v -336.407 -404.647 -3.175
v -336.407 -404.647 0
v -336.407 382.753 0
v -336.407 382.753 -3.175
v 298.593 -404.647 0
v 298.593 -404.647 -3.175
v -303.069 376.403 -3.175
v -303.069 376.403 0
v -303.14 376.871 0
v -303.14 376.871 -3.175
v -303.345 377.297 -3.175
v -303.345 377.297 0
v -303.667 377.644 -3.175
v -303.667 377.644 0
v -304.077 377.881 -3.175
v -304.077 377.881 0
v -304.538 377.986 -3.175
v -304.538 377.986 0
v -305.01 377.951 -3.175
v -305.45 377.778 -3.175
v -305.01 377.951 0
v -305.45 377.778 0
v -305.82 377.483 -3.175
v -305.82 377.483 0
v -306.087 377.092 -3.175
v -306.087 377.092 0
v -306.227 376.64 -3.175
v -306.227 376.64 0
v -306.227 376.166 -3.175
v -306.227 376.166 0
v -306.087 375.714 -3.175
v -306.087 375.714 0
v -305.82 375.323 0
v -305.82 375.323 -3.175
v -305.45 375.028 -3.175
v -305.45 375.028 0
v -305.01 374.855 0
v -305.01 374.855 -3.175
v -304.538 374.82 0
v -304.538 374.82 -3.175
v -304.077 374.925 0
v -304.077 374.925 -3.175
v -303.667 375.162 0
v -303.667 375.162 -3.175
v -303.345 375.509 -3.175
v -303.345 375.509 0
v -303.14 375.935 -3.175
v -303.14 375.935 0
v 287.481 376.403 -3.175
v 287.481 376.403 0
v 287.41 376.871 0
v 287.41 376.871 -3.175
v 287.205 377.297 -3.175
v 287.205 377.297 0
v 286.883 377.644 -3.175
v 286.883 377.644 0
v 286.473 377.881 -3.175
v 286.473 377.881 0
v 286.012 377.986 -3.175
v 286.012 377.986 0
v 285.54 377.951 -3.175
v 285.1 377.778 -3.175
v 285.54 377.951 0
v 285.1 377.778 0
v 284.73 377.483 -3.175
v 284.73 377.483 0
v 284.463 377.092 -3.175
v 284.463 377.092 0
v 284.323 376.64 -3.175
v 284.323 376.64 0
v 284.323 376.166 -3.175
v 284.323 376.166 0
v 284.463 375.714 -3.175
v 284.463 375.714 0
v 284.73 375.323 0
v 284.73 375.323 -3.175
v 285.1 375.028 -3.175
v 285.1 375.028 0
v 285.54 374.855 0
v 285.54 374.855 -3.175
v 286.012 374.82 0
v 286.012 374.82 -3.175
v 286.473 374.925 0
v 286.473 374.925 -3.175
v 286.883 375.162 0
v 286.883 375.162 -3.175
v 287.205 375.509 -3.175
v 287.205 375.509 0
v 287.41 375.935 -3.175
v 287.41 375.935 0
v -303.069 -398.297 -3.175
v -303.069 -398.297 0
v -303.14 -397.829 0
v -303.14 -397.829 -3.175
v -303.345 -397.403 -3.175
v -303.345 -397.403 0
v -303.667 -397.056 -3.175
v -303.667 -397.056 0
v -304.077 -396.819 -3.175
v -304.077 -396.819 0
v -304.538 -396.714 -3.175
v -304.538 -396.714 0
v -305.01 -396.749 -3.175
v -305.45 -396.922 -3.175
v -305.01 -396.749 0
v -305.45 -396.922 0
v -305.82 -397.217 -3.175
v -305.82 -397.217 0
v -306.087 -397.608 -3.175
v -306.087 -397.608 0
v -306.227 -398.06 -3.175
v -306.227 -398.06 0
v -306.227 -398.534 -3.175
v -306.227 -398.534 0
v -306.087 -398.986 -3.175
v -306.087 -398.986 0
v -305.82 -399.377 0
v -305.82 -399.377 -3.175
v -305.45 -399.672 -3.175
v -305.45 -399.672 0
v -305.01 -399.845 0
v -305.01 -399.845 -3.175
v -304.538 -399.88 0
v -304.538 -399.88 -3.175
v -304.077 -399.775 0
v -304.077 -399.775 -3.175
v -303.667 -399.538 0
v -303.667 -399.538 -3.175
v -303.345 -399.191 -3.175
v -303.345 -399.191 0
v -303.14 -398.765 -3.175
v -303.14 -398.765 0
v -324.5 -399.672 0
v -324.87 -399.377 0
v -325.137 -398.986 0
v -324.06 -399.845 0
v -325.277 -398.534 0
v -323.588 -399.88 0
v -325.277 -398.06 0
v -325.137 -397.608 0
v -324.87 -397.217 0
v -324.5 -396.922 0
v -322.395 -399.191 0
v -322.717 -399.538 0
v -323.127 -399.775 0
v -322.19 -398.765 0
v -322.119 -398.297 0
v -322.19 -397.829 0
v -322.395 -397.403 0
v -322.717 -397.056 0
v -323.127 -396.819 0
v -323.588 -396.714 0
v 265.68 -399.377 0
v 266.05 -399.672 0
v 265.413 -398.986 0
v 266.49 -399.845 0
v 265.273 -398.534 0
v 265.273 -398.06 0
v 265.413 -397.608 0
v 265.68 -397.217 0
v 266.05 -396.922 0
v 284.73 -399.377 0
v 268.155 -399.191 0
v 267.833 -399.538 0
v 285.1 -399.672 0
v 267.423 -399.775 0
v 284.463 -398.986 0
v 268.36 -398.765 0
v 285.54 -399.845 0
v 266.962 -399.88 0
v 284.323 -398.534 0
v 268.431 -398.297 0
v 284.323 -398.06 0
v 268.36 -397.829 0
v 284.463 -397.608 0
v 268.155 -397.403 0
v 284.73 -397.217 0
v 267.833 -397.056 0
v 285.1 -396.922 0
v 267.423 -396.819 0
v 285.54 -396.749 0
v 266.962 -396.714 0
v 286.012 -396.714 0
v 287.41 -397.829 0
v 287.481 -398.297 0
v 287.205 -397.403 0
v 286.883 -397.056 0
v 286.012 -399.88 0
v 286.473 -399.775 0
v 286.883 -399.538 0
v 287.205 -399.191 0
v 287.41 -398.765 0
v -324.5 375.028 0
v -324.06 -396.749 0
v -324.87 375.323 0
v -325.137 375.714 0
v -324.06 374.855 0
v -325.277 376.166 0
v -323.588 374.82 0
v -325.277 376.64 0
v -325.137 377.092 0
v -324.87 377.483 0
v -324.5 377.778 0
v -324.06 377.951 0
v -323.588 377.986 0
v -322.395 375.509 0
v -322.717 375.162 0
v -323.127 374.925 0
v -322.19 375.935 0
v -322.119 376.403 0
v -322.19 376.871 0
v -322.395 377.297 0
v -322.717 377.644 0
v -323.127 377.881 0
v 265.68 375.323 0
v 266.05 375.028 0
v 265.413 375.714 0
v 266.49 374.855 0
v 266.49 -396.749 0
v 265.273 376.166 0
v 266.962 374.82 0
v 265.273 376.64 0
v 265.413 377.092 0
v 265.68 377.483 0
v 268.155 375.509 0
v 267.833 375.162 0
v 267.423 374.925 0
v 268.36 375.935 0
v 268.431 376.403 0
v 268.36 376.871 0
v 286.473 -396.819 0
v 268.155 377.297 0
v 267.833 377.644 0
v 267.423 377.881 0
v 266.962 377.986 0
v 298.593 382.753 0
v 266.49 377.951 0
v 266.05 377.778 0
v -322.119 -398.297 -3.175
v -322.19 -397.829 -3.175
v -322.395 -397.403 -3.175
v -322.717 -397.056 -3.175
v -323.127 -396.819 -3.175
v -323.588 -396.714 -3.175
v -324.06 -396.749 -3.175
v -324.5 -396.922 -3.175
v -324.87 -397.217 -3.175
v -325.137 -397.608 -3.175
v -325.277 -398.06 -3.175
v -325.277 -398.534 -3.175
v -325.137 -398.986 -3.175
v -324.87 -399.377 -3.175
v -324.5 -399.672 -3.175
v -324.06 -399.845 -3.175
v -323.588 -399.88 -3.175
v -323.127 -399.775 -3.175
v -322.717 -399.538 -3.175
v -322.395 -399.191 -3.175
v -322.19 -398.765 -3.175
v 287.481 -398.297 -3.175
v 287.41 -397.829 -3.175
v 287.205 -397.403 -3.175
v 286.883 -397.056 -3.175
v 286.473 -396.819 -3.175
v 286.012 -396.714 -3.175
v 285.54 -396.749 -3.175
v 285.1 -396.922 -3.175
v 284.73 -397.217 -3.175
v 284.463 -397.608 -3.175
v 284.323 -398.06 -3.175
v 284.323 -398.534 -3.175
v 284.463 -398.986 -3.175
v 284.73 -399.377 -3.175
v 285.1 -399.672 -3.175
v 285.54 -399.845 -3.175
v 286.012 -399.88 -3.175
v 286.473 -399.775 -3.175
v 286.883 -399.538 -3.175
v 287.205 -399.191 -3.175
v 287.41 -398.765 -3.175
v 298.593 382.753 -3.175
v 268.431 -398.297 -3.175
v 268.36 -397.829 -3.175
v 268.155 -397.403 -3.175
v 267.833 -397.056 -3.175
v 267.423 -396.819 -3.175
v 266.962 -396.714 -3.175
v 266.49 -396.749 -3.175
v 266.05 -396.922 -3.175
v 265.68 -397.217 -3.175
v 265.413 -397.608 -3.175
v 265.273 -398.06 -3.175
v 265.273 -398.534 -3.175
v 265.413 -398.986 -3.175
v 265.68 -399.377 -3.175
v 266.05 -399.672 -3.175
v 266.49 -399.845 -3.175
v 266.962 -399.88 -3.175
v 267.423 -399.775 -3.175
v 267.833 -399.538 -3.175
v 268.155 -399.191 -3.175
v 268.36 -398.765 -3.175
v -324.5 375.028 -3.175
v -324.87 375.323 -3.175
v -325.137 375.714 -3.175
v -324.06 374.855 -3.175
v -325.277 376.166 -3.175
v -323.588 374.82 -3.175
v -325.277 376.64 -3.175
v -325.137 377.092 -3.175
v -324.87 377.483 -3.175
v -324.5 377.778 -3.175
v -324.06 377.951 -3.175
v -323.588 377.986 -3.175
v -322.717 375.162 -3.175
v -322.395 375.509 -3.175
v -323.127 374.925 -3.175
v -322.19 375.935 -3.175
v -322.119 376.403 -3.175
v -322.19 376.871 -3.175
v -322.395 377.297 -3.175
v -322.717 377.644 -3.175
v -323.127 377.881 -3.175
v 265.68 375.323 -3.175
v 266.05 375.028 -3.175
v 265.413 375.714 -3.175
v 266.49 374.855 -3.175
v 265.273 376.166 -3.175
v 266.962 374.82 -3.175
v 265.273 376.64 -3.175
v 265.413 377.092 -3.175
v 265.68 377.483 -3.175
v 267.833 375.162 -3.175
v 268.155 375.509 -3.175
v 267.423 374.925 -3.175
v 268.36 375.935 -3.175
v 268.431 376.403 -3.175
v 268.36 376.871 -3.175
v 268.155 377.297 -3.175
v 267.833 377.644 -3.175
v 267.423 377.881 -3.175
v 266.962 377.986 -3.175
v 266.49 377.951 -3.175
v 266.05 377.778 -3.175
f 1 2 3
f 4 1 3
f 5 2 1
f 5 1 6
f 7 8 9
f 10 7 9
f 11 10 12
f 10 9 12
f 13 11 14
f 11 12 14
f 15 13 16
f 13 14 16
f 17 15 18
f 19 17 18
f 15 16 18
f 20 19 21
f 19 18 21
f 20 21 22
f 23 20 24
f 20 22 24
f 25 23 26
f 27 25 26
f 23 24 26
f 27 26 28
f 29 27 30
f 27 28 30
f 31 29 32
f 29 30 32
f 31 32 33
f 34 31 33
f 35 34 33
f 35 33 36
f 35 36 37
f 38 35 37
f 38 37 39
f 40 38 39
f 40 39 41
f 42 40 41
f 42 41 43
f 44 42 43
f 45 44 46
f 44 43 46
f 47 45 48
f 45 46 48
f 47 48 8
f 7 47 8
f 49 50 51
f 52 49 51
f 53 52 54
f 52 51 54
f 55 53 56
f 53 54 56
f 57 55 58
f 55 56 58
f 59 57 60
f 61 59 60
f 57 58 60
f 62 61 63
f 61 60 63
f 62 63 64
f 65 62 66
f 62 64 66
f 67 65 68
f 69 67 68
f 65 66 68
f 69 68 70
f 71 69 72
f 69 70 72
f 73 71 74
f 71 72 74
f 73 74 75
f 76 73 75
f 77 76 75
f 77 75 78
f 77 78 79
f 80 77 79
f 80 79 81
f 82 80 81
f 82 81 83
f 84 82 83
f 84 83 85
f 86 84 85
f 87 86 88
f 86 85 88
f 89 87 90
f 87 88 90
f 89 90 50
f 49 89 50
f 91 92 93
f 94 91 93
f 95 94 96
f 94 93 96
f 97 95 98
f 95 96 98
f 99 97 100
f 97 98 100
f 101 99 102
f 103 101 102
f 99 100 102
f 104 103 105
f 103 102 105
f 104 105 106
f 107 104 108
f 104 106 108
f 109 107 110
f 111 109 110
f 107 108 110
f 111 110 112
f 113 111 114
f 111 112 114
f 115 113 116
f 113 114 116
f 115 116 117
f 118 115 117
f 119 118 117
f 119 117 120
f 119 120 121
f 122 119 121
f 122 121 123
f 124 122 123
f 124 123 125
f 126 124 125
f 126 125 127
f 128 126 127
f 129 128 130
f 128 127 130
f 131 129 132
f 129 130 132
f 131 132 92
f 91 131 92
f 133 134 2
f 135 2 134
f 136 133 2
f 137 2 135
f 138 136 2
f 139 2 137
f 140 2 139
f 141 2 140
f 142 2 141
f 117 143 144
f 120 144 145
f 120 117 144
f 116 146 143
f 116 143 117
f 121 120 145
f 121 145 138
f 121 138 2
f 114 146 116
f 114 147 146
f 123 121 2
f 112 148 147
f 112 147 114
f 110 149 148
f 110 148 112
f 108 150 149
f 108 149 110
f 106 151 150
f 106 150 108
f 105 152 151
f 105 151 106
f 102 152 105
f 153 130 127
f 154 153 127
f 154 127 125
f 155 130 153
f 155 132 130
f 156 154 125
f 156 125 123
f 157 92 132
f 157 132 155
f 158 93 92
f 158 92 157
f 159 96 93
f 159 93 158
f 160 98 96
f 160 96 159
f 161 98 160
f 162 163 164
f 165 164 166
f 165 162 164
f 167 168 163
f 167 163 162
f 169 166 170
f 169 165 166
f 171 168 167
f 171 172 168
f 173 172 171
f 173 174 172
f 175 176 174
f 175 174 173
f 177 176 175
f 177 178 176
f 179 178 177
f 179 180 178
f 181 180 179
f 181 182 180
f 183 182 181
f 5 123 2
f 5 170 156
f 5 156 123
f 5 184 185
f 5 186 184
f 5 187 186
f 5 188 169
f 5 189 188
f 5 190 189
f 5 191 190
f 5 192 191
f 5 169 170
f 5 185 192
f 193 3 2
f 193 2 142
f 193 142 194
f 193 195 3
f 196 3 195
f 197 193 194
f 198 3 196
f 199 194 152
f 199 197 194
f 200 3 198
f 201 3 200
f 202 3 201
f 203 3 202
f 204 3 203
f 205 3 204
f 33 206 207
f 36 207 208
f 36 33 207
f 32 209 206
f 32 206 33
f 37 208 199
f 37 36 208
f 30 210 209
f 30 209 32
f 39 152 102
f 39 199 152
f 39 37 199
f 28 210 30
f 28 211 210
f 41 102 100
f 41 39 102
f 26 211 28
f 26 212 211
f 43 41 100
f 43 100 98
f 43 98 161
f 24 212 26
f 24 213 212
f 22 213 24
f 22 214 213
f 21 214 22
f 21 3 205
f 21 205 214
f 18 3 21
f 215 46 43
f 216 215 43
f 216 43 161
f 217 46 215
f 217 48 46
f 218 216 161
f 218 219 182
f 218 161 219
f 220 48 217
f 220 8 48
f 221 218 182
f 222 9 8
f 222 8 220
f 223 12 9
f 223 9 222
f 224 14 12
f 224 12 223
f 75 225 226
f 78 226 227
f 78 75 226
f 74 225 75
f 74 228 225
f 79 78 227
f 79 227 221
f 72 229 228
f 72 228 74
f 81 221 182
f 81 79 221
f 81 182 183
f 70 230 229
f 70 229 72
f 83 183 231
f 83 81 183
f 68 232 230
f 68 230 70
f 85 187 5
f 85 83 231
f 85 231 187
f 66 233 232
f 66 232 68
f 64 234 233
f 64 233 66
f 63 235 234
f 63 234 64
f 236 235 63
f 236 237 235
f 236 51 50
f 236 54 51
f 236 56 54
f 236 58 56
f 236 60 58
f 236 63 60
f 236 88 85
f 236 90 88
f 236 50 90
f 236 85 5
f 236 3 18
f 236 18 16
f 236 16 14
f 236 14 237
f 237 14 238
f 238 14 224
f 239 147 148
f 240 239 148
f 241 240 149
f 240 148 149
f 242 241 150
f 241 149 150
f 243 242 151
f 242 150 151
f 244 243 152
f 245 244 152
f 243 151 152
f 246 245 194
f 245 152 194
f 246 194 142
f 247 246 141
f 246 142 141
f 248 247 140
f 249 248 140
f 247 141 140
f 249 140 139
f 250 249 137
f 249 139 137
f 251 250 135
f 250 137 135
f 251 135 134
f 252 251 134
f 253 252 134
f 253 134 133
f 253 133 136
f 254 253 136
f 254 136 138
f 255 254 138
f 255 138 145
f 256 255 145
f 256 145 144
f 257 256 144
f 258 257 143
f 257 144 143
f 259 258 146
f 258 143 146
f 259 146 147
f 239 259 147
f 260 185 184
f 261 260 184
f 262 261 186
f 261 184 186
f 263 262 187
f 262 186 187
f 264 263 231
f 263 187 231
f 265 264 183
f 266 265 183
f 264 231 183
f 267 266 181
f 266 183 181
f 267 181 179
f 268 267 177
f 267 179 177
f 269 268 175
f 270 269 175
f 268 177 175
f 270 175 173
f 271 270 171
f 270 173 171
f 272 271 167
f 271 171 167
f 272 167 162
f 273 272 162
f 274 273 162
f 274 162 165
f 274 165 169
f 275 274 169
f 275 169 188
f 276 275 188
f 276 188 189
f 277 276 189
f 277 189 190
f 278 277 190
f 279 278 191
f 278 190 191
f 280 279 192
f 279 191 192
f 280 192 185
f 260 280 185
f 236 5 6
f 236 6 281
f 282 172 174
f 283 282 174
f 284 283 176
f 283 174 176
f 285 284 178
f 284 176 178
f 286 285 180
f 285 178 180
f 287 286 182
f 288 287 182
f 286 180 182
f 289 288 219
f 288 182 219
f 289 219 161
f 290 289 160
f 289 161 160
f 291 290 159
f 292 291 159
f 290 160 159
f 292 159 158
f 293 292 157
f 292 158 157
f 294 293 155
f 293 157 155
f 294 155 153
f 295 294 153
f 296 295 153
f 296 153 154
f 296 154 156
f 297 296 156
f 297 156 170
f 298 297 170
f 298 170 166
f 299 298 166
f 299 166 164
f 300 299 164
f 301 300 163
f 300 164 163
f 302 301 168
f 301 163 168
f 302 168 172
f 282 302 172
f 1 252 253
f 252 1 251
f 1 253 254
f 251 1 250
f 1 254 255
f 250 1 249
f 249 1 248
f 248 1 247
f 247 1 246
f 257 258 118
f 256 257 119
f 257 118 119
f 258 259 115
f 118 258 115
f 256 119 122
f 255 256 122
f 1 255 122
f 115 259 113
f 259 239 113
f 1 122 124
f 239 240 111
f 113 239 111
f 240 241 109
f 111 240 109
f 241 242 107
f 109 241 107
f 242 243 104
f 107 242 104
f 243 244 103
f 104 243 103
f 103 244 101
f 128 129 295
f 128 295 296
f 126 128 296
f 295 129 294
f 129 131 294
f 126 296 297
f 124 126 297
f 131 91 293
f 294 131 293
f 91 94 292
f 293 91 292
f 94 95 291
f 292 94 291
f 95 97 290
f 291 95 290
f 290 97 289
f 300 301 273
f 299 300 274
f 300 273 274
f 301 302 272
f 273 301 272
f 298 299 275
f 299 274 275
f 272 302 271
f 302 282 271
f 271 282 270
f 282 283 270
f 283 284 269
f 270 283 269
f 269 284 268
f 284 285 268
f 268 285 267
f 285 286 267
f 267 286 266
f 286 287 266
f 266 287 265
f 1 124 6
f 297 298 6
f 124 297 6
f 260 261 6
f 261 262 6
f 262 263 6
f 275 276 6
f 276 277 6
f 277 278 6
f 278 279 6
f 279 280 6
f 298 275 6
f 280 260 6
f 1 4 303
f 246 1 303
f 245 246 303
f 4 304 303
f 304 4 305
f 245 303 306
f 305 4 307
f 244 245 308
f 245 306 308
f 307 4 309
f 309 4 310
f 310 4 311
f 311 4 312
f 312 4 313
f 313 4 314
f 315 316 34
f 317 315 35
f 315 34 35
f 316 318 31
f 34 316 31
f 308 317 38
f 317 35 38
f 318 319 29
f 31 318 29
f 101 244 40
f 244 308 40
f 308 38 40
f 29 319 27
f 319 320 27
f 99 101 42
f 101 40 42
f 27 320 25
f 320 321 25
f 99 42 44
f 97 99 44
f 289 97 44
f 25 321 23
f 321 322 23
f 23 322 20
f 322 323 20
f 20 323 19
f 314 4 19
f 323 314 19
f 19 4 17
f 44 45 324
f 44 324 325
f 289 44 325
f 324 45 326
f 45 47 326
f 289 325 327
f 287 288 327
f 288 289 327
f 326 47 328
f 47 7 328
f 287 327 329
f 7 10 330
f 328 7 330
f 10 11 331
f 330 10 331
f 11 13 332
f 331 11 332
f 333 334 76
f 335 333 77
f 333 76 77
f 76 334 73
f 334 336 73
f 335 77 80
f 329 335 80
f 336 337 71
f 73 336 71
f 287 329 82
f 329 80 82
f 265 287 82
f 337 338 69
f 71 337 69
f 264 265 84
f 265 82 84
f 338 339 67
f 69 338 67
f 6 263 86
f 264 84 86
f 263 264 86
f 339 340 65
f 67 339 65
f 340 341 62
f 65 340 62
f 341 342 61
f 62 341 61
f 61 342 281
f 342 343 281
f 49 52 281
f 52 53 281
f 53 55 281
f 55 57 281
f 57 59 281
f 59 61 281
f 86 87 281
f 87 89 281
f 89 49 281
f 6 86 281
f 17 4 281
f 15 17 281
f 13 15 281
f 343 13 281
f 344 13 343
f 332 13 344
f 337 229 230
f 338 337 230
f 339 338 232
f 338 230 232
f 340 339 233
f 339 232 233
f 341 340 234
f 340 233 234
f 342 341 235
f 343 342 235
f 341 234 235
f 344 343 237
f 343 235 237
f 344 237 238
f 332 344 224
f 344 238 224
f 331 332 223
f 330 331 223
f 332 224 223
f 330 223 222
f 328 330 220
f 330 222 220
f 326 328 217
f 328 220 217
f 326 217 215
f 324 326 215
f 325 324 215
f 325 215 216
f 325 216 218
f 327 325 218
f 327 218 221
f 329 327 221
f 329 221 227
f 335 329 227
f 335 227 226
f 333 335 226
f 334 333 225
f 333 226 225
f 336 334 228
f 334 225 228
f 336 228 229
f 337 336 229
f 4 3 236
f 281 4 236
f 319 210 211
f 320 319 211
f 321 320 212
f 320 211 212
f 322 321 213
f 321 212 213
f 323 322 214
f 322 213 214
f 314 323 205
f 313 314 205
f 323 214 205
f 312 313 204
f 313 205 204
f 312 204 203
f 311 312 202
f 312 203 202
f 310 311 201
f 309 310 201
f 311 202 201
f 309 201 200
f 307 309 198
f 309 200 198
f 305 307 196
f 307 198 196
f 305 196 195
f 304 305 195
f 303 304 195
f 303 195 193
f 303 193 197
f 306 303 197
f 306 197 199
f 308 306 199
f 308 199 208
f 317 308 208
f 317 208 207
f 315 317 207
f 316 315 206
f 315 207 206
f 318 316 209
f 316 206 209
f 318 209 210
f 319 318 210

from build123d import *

# Parameters (mm, degrees)
F0_W     = 635
F0_H     = 787.4
F0_R     = 1.5875
F1_DEPTH = 3.175


with BuildPart() as f1:
    # F0 (on Top) → F1 (new body)
    with BuildSketch(Plane.XY):
        with Locations((-18.906738, -10.947095)):
            Rectangle(F0_W, F0_H)
        with Locations((-323.706738, -398.297095)):
            Circle(F0_R, mode=Mode.SUBTRACT)
        with Locations((-304.656738, -398.297095)):
            Circle(F0_R, mode=Mode.SUBTRACT)
        with Locations((266.843262, -398.297095)):
            Circle(F0_R, mode=Mode.SUBTRACT)
        with Locations((285.893262, -398.297095)):
            Circle(F0_R, mode=Mode.SUBTRACT)
        with Locations((-323.706738, 376.402905)):
            Circle(F0_R, mode=Mode.SUBTRACT)
        with Locations((-304.656738, 376.402905)):
            Circle(F0_R, mode=Mode.SUBTRACT)
        with Locations((266.843262, 376.402905)):
            Circle(F0_R, mode=Mode.SUBTRACT)
        with Locations((285.893262, 376.402905)):
            Circle(F0_R, mode=Mode.SUBTRACT)
    extrude(amount=-F1_DEPTH)


solid = f1.part
